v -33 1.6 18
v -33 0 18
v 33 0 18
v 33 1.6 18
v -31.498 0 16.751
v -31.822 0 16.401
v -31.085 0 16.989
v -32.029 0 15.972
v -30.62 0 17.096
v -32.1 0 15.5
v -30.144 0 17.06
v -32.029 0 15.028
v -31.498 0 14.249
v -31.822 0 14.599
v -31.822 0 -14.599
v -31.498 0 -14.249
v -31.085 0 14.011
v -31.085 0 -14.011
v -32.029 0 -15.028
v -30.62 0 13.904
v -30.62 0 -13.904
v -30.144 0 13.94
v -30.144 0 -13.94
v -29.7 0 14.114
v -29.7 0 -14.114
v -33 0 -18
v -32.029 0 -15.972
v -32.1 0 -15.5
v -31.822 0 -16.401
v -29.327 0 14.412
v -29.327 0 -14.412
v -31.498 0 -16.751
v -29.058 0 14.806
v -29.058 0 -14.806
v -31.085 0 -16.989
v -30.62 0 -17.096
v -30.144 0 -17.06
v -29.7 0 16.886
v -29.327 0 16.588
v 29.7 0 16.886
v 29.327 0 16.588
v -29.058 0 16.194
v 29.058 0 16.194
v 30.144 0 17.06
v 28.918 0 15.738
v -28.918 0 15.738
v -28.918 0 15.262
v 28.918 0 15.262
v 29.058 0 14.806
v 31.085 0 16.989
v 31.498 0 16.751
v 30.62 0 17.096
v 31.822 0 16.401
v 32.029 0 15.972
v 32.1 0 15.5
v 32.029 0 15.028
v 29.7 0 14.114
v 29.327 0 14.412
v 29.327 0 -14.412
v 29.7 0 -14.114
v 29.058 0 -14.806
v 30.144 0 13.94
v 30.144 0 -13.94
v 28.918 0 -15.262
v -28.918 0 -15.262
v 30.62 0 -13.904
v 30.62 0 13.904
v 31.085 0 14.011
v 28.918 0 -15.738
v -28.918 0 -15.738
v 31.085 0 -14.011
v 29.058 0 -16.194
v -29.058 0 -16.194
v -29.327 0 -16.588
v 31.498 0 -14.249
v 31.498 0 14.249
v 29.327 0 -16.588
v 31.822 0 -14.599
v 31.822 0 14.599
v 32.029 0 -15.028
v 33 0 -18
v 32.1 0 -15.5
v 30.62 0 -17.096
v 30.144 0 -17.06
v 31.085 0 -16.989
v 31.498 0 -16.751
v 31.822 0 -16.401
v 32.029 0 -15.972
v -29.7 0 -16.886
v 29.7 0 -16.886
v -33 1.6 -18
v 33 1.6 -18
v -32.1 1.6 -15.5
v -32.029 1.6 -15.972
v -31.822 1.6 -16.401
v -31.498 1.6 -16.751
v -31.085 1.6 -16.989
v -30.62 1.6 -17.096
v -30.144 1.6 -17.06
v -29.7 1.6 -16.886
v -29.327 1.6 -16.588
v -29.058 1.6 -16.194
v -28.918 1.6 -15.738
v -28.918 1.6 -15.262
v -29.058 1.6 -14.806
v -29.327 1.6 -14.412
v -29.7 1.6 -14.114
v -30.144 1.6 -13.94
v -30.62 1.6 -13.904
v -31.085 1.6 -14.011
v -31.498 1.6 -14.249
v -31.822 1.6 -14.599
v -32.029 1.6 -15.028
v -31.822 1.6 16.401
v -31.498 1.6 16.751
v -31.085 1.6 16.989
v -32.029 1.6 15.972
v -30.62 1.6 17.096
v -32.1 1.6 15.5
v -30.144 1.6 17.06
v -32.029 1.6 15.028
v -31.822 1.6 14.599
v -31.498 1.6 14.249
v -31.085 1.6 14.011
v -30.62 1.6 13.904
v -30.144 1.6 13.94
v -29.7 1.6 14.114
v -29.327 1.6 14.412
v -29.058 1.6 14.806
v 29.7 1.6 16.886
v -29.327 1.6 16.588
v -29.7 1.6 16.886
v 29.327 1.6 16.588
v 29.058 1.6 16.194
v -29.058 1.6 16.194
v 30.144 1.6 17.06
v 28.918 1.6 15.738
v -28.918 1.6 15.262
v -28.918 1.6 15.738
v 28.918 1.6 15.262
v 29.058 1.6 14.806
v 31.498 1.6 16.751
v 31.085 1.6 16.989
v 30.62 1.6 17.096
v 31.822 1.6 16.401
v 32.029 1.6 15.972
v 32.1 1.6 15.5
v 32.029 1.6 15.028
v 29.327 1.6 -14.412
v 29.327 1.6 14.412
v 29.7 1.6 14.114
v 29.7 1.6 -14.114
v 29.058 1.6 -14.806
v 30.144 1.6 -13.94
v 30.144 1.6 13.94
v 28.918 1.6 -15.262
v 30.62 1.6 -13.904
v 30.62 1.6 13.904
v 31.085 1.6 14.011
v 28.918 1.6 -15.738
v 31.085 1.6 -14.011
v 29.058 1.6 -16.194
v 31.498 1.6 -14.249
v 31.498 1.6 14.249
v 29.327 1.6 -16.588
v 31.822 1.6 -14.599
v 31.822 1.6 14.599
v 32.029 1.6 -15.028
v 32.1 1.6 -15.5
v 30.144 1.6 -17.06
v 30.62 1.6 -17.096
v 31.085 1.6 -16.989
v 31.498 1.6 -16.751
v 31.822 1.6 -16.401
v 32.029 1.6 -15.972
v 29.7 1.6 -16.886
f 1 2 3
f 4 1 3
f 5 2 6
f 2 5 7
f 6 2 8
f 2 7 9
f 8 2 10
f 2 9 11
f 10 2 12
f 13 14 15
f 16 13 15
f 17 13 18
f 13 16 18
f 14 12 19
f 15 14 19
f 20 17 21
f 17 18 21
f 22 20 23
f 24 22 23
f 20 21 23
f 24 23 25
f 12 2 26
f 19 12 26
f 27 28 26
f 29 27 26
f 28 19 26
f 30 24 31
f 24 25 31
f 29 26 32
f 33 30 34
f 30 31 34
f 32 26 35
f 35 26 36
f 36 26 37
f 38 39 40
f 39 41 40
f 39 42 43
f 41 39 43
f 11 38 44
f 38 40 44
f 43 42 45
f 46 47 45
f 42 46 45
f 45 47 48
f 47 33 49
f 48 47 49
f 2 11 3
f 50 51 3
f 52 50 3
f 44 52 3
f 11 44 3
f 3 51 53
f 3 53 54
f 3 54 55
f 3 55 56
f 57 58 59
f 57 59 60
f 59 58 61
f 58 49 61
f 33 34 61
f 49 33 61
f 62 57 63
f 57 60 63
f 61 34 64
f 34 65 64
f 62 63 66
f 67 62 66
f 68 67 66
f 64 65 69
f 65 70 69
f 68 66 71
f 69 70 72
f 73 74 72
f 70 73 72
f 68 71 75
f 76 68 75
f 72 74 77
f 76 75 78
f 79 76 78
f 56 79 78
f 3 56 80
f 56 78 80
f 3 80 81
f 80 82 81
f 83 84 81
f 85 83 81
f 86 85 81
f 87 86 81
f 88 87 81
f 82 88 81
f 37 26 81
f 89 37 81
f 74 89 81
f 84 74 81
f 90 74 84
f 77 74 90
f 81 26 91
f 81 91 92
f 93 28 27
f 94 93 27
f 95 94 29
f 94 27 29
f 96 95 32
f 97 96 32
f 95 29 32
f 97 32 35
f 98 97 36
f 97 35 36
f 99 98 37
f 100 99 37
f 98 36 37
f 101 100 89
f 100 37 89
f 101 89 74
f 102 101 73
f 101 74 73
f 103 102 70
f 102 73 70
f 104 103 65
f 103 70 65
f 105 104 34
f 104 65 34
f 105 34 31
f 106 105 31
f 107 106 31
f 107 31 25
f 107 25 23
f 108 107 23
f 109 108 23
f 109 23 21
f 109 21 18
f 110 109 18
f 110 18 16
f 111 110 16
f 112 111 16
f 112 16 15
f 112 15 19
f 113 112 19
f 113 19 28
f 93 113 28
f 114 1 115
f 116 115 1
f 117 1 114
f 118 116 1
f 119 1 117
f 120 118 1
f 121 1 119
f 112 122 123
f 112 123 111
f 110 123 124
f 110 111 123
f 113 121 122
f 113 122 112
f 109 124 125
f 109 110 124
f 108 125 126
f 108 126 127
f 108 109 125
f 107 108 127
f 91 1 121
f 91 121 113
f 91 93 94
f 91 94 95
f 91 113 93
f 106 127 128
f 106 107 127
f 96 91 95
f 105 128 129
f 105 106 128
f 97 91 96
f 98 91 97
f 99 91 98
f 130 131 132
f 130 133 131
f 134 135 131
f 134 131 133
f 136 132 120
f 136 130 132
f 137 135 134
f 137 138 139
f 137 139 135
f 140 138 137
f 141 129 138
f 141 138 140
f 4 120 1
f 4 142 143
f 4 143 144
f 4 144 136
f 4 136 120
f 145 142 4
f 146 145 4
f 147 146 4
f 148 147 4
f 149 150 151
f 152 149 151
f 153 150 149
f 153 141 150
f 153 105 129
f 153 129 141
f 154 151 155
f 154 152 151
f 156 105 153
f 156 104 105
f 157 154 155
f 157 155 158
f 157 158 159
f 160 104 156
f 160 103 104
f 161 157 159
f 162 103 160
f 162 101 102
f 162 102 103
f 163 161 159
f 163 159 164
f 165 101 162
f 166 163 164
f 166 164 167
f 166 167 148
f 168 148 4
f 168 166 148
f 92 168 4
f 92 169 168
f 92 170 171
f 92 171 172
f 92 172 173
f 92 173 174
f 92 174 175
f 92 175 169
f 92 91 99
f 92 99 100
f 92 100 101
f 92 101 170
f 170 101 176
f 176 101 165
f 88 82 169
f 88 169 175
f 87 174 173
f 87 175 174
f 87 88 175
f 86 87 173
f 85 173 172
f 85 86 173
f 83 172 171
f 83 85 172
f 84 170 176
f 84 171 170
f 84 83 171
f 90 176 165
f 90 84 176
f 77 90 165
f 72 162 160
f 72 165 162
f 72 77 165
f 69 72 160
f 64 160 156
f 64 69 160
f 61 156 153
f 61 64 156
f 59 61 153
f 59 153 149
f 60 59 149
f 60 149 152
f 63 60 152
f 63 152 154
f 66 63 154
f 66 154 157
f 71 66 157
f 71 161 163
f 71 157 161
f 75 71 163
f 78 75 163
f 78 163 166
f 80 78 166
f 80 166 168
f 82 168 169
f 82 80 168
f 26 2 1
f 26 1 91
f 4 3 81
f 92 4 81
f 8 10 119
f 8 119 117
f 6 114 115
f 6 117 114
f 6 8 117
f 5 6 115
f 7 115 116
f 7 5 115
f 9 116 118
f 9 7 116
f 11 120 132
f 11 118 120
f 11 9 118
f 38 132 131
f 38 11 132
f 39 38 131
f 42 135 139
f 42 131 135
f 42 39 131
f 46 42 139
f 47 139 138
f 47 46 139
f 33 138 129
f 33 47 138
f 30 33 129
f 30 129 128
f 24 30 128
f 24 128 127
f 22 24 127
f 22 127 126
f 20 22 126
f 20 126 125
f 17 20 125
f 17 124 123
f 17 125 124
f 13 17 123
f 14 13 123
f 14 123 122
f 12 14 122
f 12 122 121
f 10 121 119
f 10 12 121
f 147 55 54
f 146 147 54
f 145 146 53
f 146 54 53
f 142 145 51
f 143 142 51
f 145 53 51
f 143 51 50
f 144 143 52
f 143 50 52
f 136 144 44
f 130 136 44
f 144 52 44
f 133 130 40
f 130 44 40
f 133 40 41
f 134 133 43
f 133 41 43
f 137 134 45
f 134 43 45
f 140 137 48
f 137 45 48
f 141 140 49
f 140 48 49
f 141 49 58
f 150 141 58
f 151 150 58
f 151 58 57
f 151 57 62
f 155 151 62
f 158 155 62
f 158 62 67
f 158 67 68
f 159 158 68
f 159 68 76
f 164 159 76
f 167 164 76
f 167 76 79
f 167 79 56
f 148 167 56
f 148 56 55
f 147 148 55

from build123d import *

# Parameters (mm, degrees)
SKETCH1_W            = 66
SKETCH1_H            = 36
BOSS_EXTRUDE1_DEPTH  = 1.6
M3_CLEARANCE_HOLE1_D = 3.2
MIRROR2_COPY_1_D     = 3.2


with BuildPart() as part:
    # Sketch1 → Boss-Extrude1 (new body)
    with BuildSketch(Plane(origin=(0, 0, 0), x_dir=(1, 0, 0), z_dir=(0, 1, 0))):
        Rectangle(SKETCH1_W, SKETCH1_H)
    extrude(amount=BOSS_EXTRUDE1_DEPTH)

    # M3 Clearance Hole1 (through all)
    with Locations(Plane(origin=(0, 1.6, 0), x_dir=(1, 0, 0), z_dir=(0, 1, 0))):
        with Locations((-30.5, 15.5)):
            m3_clearance_hole1 = Hole(M3_CLEARANCE_HOLE1_D / 2)

    # Mirror1: M3 Clearance Hole1 across plane
    add(m3_clearance_hole1.mirror(Plane(origin=(0, 0, 0), x_dir=(0, 0, 1), z_dir=(1, 0, 0))), mode=Mode.SUBTRACT)

    # Mirror2: M3 Clearance Hole1 across plane
    add(m3_clearance_hole1.mirror(Plane.XY), mode=Mode.SUBTRACT)

    # Mirror2 copy 1 (through all)
    with Locations(Plane(origin=(0, 1.6, 0), x_dir=(-1, 0, 0), z_dir=(0, 1, 0))):
        with Locations((-30.5, 15.5)):
            Hole(MIRROR2_COPY_1_D / 2)


solid = part.part
